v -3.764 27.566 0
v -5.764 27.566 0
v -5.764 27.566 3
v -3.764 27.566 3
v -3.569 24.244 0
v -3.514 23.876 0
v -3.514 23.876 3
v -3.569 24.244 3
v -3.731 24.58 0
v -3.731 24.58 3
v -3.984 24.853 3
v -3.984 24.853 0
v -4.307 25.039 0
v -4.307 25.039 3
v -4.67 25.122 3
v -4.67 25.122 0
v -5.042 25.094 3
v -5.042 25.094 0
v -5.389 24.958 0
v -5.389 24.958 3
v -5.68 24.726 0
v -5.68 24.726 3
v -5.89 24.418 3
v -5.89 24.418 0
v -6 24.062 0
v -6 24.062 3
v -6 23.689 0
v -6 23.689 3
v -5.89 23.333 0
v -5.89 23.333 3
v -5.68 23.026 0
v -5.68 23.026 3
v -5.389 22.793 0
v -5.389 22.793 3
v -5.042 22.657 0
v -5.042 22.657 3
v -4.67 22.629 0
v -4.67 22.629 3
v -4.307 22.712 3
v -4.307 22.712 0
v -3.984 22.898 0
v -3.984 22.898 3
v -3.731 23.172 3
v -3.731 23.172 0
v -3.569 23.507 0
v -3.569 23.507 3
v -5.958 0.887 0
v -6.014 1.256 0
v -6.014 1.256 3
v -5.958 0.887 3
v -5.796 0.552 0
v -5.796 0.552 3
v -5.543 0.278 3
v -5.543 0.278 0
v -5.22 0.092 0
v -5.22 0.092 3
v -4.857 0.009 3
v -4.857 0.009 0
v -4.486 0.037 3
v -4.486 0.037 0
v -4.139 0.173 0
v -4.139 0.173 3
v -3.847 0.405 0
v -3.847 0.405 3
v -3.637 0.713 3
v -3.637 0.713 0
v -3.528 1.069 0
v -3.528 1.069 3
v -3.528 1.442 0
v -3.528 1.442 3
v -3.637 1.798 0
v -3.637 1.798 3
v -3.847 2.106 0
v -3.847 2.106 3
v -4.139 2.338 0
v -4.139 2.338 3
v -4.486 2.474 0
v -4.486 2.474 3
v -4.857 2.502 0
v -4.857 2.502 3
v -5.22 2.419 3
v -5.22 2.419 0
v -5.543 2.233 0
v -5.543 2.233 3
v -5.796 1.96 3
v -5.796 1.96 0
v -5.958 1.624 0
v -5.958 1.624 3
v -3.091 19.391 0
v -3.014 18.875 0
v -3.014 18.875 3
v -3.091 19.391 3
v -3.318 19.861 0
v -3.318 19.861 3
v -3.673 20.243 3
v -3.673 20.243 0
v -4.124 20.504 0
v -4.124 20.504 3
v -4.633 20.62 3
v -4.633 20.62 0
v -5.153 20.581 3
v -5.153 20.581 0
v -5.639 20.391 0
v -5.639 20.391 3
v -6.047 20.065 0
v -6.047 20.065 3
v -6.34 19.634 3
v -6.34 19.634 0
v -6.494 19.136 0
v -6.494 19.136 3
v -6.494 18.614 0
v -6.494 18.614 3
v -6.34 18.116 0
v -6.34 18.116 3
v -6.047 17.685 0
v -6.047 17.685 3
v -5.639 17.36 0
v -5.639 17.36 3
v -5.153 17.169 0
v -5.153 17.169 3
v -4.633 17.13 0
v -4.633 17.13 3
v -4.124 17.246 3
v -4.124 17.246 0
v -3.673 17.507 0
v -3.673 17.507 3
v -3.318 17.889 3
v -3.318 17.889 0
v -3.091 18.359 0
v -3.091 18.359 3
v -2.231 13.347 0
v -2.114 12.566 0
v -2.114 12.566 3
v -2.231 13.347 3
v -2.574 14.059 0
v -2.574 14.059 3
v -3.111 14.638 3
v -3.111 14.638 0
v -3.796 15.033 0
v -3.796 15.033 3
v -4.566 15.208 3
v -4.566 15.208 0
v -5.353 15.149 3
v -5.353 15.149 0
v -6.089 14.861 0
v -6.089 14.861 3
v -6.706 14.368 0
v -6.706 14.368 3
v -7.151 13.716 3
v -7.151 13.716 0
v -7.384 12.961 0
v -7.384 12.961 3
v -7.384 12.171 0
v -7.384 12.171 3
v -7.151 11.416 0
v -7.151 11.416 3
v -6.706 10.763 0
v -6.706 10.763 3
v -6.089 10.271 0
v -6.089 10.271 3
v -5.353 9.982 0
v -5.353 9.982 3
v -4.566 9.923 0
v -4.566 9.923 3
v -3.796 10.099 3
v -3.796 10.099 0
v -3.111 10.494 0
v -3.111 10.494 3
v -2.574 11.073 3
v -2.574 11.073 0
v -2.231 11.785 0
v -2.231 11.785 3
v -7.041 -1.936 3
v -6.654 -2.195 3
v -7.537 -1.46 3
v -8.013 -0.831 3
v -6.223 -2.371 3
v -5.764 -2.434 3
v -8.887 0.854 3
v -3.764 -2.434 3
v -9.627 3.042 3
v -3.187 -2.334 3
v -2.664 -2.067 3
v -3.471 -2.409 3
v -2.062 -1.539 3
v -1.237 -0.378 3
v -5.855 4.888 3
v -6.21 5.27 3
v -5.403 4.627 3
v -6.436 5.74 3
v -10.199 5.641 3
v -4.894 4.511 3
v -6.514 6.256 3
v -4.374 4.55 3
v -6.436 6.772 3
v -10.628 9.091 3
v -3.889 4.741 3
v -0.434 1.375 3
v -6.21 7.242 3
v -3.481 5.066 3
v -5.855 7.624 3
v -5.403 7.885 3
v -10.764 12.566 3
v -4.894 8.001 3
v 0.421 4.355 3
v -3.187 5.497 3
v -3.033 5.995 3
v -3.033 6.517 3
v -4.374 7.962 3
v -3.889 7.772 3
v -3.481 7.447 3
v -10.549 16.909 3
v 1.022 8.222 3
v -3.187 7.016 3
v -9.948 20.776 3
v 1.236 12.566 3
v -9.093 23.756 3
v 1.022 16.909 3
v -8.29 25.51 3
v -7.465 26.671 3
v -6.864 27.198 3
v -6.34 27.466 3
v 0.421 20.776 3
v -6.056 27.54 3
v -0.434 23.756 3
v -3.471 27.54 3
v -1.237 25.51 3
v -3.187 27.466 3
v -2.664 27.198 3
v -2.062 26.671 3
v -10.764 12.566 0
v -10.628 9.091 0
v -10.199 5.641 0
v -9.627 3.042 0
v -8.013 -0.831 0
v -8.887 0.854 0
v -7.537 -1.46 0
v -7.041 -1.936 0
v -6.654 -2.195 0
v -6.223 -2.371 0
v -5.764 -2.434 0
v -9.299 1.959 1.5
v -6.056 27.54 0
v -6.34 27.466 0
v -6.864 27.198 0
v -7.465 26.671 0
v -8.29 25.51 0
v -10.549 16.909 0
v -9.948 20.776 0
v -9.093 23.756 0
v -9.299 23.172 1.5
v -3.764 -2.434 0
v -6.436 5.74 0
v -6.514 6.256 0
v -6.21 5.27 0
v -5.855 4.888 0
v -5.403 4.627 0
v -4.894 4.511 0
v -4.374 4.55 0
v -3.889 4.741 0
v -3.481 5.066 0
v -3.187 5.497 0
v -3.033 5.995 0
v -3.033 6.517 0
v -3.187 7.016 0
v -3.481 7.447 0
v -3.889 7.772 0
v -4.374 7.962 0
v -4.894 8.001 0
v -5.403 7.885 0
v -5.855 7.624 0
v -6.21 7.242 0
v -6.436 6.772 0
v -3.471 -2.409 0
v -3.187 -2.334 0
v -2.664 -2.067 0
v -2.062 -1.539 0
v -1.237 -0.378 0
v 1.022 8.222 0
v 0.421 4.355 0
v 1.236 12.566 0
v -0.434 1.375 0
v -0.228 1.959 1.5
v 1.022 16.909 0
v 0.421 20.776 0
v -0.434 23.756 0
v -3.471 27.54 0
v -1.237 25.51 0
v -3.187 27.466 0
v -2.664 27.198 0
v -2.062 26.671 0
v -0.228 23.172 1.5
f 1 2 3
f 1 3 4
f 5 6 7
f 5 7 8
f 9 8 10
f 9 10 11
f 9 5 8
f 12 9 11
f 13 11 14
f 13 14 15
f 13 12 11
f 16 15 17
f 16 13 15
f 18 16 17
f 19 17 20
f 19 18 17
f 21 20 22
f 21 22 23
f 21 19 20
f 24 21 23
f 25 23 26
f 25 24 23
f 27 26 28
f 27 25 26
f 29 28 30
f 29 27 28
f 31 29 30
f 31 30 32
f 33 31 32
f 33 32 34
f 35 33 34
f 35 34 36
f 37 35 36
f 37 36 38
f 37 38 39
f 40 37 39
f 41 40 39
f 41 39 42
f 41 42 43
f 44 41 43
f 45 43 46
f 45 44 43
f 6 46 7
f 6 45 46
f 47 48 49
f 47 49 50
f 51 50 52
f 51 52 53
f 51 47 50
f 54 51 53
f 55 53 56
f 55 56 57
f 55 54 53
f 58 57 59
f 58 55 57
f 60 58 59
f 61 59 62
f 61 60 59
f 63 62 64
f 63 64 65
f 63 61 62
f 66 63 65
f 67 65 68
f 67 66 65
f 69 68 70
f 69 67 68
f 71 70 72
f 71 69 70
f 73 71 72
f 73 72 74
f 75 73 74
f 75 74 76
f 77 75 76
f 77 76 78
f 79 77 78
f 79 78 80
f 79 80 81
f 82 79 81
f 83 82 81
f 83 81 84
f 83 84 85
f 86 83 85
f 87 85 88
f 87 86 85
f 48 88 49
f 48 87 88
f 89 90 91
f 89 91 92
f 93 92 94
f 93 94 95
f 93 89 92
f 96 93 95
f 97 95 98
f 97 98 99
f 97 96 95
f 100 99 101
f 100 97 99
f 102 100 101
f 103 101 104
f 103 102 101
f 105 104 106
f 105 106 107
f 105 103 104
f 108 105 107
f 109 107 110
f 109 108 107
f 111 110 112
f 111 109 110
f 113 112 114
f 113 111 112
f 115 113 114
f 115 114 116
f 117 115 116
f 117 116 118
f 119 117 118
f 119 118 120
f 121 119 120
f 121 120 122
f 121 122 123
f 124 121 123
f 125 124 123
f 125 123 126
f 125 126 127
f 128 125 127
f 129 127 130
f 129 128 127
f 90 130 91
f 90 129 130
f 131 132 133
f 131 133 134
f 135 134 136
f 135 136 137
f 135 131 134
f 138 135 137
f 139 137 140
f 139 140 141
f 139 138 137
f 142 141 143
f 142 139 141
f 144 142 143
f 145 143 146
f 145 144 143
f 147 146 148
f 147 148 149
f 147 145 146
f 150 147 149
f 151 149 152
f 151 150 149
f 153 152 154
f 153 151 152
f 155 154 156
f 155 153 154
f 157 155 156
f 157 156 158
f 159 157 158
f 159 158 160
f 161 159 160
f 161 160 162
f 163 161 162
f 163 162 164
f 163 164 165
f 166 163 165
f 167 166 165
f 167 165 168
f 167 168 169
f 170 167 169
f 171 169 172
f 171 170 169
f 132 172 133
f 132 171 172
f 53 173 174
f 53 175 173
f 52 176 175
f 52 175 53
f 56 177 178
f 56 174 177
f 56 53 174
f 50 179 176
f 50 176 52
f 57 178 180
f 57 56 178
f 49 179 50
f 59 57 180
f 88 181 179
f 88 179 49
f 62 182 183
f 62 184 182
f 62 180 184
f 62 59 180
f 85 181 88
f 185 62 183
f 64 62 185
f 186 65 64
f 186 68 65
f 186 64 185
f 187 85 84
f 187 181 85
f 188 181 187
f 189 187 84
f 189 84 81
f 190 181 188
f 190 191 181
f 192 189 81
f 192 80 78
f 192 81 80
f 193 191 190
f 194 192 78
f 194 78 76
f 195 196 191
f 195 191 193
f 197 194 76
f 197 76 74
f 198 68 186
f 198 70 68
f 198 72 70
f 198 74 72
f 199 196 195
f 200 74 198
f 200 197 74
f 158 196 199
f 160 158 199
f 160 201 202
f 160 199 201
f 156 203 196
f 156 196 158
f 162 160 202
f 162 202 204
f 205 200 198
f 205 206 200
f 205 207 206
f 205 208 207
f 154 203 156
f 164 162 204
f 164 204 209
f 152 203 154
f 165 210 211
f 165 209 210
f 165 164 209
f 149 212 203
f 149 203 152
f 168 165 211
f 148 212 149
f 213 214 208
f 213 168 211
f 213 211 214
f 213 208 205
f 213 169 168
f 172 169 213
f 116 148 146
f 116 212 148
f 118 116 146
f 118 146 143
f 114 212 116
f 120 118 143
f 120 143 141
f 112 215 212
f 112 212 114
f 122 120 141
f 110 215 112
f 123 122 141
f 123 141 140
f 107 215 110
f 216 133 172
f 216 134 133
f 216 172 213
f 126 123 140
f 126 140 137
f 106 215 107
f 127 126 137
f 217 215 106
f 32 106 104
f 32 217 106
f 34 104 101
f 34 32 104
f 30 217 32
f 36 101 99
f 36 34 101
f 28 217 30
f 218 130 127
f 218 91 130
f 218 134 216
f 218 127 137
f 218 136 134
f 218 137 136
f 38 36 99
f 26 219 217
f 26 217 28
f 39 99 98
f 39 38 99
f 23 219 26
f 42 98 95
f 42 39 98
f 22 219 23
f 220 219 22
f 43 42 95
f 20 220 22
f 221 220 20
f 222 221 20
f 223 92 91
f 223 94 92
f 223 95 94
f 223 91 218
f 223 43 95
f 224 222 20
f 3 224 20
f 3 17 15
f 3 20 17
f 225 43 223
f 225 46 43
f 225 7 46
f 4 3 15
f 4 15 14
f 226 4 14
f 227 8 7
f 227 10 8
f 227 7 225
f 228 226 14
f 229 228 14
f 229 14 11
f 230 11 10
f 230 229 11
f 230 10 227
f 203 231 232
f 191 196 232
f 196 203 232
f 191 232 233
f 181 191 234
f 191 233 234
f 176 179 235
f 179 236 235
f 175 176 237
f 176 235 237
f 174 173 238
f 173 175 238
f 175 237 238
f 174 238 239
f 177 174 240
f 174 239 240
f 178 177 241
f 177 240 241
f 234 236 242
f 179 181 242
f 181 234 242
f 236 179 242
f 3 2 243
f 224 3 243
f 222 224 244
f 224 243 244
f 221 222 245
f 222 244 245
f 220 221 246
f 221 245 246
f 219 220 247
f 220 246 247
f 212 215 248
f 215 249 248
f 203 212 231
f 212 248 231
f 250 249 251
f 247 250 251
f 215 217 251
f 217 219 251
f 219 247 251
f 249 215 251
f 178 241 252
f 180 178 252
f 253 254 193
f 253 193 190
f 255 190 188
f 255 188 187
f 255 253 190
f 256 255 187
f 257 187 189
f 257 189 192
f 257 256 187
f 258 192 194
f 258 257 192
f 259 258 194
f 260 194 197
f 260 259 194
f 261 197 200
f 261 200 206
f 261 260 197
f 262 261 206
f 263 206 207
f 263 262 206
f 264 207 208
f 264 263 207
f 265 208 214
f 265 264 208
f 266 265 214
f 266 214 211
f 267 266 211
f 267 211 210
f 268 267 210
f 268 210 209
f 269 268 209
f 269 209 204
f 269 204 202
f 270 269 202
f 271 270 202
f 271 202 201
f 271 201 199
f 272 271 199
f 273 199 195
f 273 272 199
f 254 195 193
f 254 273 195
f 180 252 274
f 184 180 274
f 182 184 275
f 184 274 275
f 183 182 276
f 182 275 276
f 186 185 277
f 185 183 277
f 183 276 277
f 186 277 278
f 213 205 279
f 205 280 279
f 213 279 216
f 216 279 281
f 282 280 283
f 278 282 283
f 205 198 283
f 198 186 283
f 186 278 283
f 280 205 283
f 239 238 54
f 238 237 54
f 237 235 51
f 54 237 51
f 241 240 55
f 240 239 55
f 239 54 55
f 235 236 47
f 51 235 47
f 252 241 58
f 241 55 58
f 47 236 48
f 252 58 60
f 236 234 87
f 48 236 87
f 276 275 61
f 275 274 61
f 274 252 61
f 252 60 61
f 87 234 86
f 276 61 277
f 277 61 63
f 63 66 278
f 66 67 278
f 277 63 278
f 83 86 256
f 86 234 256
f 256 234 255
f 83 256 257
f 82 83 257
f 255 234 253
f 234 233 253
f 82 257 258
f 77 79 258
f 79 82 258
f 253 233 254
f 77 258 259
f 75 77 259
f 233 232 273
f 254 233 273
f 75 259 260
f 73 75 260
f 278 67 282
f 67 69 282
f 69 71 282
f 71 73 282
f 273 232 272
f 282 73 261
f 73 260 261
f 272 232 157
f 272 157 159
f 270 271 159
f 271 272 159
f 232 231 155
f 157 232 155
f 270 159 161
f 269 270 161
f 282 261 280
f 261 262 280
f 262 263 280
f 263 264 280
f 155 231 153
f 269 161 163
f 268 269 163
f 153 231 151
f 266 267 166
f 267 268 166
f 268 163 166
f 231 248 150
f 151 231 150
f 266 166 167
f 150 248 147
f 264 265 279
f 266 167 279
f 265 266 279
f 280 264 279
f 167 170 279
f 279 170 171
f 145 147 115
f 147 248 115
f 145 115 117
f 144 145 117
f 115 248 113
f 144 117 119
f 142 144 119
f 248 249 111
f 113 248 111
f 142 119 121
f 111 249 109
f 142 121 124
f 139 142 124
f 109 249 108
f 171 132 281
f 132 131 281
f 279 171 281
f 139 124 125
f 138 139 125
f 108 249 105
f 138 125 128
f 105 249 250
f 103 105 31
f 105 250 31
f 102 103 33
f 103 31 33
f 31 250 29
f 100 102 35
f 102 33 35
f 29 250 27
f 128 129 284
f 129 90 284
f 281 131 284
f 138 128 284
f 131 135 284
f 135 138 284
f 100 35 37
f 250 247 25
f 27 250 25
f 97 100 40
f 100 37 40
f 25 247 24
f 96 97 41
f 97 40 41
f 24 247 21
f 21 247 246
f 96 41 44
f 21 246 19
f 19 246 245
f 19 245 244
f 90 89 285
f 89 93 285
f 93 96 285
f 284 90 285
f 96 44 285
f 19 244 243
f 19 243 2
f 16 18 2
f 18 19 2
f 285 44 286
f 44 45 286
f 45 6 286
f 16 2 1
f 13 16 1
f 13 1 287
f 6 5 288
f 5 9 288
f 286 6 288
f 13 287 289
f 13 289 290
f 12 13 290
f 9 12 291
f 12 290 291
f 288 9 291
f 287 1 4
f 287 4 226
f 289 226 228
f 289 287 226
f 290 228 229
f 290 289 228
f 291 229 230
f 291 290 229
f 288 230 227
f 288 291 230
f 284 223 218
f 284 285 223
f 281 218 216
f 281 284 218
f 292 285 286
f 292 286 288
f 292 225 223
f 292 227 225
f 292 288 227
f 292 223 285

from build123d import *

# Parameters (mm, degrees)
SKETCH_1_W      = 12
SKETCH_1_H      = 30
SKETCH_1_R      = 2.65
SKETCH_1_R_2    = 1.25
SKETCH_1_R_3    = 1.75
EXTRUDE_1_DEPTH = 3
FILLET_1_SIZE   = 5
FILLET_1_SIZE_2 = 15
FILLET_2_SIZE   = 5
FILLET_2_SIZE_2 = 15
FILLET_3_SIZE   = 15
FILLET_3_SIZE_2 = 5
FILLET_4_SIZE   = 5
FILLET_4_SIZE_2 = 15


with BuildPart() as part:
    # 草图1 → 凸台-拉伸1 (new body)
    with BuildSketch(Plane.XY):
        with Locations((-4.763664969, 12.565714772)):
            Rectangle(SKETCH_1_W, SKETCH_1_H)
        with Locations((-4.763664969, 12.565714772)):
            Circle(SKETCH_1_R, mode=Mode.SUBTRACT)
        with Locations((-4.763664969, 23.875723392)):
            Circle(SKETCH_1_R_2, mode=Mode.SUBTRACT)
        with Locations((-4.763664969, 18.875154811)):
            Circle(SKETCH_1_R_3, mode=Mode.SUBTRACT)
        with Locations(Location((-4.763664969, 1.255706152, 0), (0, 0, 180))):
            Circle(SKETCH_1_R_2, mode=Mode.SUBTRACT)
        with Locations(Location((-4.763664969, 6.256274734, 0), (0, 0, 180))):
            Circle(SKETCH_1_R_3, mode=Mode.SUBTRACT)
    extrude(amount=EXTRUDE_1_DEPTH)

    # 圆角1
    # an asymmetric fillet: 15, 5 mm, written as the material it takes off along each edge
    with BuildSketch(Plane(origin=(-10.763664969, 27.565714772, -37.5), x_dir=(1, 0, 0), z_dir=(0, 0, 1))) as fillet_1_piece_1:
        with BuildLine():
            Bezier((FILLET_1_SIZE, 0), (0, 0), (0, -FILLET_1_SIZE_2), weights=[1, 0.707106781, 1])
            Line((0, -FILLET_1_SIZE_2), (0, 0))
            Line((0, 0), (FILLET_1_SIZE, 0))
        make_face()
    extrude(amount=78, mode=Mode.SUBTRACT)

    # 圆角2
    # an asymmetric fillet: 15, 5 mm, written as the material it takes off along each edge
    with BuildSketch(Plane(origin=(1.236335031, 27.565714772, -37.5), x_dir=(-1, 0, 0), z_dir=(0, 0, 1))) as fillet_2_piece_1:
        with BuildLine():
            Bezier((FILLET_2_SIZE, 0), (0, 0), (0, FILLET_2_SIZE_2), weights=[1, 0.707106781, 1])
            Line((0, FILLET_2_SIZE_2), (0, 0))
            Line((0, 0), (FILLET_2_SIZE, 0))
        make_face()
    extrude(amount=78, mode=Mode.SUBTRACT)

    # 圆角3
    # an asymmetric fillet: 15, 5 mm, written as the material it takes off along each edge
    with BuildSketch(Plane(origin=(-10.763664969, -2.434285228, -37.5), x_dir=(0, 1, 0), z_dir=(0, 0, 1))) as fillet_3_piece_1:
        with BuildLine():
            Bezier((FILLET_3_SIZE, 0), (0, 0), (0, -FILLET_3_SIZE_2), weights=[1, 0.707106781, 1])
            Line((0, -FILLET_3_SIZE_2), (0, 0))
            Line((0, 0), (FILLET_3_SIZE, 0))
        make_face()
    extrude(amount=78, mode=Mode.SUBTRACT)

    # 圆角4
    # an asymmetric fillet: 15, 5 mm, written as the material it takes off along each edge
    with BuildSketch(Plane(origin=(1.236335031, -2.434285228, -37.5), x_dir=(-1, 0, 0), z_dir=(0, 0, 1))) as fillet_4_piece_1:
        with BuildLine():
            Bezier((FILLET_4_SIZE, 0), (0, 0), (0, -FILLET_4_SIZE_2), weights=[1, 0.707106781, 1])
            Line((0, -FILLET_4_SIZE_2), (0, 0))
            Line((0, 0), (FILLET_4_SIZE, 0))
        make_face()
    extrude(amount=78, mode=Mode.SUBTRACT)


solid = part.part
